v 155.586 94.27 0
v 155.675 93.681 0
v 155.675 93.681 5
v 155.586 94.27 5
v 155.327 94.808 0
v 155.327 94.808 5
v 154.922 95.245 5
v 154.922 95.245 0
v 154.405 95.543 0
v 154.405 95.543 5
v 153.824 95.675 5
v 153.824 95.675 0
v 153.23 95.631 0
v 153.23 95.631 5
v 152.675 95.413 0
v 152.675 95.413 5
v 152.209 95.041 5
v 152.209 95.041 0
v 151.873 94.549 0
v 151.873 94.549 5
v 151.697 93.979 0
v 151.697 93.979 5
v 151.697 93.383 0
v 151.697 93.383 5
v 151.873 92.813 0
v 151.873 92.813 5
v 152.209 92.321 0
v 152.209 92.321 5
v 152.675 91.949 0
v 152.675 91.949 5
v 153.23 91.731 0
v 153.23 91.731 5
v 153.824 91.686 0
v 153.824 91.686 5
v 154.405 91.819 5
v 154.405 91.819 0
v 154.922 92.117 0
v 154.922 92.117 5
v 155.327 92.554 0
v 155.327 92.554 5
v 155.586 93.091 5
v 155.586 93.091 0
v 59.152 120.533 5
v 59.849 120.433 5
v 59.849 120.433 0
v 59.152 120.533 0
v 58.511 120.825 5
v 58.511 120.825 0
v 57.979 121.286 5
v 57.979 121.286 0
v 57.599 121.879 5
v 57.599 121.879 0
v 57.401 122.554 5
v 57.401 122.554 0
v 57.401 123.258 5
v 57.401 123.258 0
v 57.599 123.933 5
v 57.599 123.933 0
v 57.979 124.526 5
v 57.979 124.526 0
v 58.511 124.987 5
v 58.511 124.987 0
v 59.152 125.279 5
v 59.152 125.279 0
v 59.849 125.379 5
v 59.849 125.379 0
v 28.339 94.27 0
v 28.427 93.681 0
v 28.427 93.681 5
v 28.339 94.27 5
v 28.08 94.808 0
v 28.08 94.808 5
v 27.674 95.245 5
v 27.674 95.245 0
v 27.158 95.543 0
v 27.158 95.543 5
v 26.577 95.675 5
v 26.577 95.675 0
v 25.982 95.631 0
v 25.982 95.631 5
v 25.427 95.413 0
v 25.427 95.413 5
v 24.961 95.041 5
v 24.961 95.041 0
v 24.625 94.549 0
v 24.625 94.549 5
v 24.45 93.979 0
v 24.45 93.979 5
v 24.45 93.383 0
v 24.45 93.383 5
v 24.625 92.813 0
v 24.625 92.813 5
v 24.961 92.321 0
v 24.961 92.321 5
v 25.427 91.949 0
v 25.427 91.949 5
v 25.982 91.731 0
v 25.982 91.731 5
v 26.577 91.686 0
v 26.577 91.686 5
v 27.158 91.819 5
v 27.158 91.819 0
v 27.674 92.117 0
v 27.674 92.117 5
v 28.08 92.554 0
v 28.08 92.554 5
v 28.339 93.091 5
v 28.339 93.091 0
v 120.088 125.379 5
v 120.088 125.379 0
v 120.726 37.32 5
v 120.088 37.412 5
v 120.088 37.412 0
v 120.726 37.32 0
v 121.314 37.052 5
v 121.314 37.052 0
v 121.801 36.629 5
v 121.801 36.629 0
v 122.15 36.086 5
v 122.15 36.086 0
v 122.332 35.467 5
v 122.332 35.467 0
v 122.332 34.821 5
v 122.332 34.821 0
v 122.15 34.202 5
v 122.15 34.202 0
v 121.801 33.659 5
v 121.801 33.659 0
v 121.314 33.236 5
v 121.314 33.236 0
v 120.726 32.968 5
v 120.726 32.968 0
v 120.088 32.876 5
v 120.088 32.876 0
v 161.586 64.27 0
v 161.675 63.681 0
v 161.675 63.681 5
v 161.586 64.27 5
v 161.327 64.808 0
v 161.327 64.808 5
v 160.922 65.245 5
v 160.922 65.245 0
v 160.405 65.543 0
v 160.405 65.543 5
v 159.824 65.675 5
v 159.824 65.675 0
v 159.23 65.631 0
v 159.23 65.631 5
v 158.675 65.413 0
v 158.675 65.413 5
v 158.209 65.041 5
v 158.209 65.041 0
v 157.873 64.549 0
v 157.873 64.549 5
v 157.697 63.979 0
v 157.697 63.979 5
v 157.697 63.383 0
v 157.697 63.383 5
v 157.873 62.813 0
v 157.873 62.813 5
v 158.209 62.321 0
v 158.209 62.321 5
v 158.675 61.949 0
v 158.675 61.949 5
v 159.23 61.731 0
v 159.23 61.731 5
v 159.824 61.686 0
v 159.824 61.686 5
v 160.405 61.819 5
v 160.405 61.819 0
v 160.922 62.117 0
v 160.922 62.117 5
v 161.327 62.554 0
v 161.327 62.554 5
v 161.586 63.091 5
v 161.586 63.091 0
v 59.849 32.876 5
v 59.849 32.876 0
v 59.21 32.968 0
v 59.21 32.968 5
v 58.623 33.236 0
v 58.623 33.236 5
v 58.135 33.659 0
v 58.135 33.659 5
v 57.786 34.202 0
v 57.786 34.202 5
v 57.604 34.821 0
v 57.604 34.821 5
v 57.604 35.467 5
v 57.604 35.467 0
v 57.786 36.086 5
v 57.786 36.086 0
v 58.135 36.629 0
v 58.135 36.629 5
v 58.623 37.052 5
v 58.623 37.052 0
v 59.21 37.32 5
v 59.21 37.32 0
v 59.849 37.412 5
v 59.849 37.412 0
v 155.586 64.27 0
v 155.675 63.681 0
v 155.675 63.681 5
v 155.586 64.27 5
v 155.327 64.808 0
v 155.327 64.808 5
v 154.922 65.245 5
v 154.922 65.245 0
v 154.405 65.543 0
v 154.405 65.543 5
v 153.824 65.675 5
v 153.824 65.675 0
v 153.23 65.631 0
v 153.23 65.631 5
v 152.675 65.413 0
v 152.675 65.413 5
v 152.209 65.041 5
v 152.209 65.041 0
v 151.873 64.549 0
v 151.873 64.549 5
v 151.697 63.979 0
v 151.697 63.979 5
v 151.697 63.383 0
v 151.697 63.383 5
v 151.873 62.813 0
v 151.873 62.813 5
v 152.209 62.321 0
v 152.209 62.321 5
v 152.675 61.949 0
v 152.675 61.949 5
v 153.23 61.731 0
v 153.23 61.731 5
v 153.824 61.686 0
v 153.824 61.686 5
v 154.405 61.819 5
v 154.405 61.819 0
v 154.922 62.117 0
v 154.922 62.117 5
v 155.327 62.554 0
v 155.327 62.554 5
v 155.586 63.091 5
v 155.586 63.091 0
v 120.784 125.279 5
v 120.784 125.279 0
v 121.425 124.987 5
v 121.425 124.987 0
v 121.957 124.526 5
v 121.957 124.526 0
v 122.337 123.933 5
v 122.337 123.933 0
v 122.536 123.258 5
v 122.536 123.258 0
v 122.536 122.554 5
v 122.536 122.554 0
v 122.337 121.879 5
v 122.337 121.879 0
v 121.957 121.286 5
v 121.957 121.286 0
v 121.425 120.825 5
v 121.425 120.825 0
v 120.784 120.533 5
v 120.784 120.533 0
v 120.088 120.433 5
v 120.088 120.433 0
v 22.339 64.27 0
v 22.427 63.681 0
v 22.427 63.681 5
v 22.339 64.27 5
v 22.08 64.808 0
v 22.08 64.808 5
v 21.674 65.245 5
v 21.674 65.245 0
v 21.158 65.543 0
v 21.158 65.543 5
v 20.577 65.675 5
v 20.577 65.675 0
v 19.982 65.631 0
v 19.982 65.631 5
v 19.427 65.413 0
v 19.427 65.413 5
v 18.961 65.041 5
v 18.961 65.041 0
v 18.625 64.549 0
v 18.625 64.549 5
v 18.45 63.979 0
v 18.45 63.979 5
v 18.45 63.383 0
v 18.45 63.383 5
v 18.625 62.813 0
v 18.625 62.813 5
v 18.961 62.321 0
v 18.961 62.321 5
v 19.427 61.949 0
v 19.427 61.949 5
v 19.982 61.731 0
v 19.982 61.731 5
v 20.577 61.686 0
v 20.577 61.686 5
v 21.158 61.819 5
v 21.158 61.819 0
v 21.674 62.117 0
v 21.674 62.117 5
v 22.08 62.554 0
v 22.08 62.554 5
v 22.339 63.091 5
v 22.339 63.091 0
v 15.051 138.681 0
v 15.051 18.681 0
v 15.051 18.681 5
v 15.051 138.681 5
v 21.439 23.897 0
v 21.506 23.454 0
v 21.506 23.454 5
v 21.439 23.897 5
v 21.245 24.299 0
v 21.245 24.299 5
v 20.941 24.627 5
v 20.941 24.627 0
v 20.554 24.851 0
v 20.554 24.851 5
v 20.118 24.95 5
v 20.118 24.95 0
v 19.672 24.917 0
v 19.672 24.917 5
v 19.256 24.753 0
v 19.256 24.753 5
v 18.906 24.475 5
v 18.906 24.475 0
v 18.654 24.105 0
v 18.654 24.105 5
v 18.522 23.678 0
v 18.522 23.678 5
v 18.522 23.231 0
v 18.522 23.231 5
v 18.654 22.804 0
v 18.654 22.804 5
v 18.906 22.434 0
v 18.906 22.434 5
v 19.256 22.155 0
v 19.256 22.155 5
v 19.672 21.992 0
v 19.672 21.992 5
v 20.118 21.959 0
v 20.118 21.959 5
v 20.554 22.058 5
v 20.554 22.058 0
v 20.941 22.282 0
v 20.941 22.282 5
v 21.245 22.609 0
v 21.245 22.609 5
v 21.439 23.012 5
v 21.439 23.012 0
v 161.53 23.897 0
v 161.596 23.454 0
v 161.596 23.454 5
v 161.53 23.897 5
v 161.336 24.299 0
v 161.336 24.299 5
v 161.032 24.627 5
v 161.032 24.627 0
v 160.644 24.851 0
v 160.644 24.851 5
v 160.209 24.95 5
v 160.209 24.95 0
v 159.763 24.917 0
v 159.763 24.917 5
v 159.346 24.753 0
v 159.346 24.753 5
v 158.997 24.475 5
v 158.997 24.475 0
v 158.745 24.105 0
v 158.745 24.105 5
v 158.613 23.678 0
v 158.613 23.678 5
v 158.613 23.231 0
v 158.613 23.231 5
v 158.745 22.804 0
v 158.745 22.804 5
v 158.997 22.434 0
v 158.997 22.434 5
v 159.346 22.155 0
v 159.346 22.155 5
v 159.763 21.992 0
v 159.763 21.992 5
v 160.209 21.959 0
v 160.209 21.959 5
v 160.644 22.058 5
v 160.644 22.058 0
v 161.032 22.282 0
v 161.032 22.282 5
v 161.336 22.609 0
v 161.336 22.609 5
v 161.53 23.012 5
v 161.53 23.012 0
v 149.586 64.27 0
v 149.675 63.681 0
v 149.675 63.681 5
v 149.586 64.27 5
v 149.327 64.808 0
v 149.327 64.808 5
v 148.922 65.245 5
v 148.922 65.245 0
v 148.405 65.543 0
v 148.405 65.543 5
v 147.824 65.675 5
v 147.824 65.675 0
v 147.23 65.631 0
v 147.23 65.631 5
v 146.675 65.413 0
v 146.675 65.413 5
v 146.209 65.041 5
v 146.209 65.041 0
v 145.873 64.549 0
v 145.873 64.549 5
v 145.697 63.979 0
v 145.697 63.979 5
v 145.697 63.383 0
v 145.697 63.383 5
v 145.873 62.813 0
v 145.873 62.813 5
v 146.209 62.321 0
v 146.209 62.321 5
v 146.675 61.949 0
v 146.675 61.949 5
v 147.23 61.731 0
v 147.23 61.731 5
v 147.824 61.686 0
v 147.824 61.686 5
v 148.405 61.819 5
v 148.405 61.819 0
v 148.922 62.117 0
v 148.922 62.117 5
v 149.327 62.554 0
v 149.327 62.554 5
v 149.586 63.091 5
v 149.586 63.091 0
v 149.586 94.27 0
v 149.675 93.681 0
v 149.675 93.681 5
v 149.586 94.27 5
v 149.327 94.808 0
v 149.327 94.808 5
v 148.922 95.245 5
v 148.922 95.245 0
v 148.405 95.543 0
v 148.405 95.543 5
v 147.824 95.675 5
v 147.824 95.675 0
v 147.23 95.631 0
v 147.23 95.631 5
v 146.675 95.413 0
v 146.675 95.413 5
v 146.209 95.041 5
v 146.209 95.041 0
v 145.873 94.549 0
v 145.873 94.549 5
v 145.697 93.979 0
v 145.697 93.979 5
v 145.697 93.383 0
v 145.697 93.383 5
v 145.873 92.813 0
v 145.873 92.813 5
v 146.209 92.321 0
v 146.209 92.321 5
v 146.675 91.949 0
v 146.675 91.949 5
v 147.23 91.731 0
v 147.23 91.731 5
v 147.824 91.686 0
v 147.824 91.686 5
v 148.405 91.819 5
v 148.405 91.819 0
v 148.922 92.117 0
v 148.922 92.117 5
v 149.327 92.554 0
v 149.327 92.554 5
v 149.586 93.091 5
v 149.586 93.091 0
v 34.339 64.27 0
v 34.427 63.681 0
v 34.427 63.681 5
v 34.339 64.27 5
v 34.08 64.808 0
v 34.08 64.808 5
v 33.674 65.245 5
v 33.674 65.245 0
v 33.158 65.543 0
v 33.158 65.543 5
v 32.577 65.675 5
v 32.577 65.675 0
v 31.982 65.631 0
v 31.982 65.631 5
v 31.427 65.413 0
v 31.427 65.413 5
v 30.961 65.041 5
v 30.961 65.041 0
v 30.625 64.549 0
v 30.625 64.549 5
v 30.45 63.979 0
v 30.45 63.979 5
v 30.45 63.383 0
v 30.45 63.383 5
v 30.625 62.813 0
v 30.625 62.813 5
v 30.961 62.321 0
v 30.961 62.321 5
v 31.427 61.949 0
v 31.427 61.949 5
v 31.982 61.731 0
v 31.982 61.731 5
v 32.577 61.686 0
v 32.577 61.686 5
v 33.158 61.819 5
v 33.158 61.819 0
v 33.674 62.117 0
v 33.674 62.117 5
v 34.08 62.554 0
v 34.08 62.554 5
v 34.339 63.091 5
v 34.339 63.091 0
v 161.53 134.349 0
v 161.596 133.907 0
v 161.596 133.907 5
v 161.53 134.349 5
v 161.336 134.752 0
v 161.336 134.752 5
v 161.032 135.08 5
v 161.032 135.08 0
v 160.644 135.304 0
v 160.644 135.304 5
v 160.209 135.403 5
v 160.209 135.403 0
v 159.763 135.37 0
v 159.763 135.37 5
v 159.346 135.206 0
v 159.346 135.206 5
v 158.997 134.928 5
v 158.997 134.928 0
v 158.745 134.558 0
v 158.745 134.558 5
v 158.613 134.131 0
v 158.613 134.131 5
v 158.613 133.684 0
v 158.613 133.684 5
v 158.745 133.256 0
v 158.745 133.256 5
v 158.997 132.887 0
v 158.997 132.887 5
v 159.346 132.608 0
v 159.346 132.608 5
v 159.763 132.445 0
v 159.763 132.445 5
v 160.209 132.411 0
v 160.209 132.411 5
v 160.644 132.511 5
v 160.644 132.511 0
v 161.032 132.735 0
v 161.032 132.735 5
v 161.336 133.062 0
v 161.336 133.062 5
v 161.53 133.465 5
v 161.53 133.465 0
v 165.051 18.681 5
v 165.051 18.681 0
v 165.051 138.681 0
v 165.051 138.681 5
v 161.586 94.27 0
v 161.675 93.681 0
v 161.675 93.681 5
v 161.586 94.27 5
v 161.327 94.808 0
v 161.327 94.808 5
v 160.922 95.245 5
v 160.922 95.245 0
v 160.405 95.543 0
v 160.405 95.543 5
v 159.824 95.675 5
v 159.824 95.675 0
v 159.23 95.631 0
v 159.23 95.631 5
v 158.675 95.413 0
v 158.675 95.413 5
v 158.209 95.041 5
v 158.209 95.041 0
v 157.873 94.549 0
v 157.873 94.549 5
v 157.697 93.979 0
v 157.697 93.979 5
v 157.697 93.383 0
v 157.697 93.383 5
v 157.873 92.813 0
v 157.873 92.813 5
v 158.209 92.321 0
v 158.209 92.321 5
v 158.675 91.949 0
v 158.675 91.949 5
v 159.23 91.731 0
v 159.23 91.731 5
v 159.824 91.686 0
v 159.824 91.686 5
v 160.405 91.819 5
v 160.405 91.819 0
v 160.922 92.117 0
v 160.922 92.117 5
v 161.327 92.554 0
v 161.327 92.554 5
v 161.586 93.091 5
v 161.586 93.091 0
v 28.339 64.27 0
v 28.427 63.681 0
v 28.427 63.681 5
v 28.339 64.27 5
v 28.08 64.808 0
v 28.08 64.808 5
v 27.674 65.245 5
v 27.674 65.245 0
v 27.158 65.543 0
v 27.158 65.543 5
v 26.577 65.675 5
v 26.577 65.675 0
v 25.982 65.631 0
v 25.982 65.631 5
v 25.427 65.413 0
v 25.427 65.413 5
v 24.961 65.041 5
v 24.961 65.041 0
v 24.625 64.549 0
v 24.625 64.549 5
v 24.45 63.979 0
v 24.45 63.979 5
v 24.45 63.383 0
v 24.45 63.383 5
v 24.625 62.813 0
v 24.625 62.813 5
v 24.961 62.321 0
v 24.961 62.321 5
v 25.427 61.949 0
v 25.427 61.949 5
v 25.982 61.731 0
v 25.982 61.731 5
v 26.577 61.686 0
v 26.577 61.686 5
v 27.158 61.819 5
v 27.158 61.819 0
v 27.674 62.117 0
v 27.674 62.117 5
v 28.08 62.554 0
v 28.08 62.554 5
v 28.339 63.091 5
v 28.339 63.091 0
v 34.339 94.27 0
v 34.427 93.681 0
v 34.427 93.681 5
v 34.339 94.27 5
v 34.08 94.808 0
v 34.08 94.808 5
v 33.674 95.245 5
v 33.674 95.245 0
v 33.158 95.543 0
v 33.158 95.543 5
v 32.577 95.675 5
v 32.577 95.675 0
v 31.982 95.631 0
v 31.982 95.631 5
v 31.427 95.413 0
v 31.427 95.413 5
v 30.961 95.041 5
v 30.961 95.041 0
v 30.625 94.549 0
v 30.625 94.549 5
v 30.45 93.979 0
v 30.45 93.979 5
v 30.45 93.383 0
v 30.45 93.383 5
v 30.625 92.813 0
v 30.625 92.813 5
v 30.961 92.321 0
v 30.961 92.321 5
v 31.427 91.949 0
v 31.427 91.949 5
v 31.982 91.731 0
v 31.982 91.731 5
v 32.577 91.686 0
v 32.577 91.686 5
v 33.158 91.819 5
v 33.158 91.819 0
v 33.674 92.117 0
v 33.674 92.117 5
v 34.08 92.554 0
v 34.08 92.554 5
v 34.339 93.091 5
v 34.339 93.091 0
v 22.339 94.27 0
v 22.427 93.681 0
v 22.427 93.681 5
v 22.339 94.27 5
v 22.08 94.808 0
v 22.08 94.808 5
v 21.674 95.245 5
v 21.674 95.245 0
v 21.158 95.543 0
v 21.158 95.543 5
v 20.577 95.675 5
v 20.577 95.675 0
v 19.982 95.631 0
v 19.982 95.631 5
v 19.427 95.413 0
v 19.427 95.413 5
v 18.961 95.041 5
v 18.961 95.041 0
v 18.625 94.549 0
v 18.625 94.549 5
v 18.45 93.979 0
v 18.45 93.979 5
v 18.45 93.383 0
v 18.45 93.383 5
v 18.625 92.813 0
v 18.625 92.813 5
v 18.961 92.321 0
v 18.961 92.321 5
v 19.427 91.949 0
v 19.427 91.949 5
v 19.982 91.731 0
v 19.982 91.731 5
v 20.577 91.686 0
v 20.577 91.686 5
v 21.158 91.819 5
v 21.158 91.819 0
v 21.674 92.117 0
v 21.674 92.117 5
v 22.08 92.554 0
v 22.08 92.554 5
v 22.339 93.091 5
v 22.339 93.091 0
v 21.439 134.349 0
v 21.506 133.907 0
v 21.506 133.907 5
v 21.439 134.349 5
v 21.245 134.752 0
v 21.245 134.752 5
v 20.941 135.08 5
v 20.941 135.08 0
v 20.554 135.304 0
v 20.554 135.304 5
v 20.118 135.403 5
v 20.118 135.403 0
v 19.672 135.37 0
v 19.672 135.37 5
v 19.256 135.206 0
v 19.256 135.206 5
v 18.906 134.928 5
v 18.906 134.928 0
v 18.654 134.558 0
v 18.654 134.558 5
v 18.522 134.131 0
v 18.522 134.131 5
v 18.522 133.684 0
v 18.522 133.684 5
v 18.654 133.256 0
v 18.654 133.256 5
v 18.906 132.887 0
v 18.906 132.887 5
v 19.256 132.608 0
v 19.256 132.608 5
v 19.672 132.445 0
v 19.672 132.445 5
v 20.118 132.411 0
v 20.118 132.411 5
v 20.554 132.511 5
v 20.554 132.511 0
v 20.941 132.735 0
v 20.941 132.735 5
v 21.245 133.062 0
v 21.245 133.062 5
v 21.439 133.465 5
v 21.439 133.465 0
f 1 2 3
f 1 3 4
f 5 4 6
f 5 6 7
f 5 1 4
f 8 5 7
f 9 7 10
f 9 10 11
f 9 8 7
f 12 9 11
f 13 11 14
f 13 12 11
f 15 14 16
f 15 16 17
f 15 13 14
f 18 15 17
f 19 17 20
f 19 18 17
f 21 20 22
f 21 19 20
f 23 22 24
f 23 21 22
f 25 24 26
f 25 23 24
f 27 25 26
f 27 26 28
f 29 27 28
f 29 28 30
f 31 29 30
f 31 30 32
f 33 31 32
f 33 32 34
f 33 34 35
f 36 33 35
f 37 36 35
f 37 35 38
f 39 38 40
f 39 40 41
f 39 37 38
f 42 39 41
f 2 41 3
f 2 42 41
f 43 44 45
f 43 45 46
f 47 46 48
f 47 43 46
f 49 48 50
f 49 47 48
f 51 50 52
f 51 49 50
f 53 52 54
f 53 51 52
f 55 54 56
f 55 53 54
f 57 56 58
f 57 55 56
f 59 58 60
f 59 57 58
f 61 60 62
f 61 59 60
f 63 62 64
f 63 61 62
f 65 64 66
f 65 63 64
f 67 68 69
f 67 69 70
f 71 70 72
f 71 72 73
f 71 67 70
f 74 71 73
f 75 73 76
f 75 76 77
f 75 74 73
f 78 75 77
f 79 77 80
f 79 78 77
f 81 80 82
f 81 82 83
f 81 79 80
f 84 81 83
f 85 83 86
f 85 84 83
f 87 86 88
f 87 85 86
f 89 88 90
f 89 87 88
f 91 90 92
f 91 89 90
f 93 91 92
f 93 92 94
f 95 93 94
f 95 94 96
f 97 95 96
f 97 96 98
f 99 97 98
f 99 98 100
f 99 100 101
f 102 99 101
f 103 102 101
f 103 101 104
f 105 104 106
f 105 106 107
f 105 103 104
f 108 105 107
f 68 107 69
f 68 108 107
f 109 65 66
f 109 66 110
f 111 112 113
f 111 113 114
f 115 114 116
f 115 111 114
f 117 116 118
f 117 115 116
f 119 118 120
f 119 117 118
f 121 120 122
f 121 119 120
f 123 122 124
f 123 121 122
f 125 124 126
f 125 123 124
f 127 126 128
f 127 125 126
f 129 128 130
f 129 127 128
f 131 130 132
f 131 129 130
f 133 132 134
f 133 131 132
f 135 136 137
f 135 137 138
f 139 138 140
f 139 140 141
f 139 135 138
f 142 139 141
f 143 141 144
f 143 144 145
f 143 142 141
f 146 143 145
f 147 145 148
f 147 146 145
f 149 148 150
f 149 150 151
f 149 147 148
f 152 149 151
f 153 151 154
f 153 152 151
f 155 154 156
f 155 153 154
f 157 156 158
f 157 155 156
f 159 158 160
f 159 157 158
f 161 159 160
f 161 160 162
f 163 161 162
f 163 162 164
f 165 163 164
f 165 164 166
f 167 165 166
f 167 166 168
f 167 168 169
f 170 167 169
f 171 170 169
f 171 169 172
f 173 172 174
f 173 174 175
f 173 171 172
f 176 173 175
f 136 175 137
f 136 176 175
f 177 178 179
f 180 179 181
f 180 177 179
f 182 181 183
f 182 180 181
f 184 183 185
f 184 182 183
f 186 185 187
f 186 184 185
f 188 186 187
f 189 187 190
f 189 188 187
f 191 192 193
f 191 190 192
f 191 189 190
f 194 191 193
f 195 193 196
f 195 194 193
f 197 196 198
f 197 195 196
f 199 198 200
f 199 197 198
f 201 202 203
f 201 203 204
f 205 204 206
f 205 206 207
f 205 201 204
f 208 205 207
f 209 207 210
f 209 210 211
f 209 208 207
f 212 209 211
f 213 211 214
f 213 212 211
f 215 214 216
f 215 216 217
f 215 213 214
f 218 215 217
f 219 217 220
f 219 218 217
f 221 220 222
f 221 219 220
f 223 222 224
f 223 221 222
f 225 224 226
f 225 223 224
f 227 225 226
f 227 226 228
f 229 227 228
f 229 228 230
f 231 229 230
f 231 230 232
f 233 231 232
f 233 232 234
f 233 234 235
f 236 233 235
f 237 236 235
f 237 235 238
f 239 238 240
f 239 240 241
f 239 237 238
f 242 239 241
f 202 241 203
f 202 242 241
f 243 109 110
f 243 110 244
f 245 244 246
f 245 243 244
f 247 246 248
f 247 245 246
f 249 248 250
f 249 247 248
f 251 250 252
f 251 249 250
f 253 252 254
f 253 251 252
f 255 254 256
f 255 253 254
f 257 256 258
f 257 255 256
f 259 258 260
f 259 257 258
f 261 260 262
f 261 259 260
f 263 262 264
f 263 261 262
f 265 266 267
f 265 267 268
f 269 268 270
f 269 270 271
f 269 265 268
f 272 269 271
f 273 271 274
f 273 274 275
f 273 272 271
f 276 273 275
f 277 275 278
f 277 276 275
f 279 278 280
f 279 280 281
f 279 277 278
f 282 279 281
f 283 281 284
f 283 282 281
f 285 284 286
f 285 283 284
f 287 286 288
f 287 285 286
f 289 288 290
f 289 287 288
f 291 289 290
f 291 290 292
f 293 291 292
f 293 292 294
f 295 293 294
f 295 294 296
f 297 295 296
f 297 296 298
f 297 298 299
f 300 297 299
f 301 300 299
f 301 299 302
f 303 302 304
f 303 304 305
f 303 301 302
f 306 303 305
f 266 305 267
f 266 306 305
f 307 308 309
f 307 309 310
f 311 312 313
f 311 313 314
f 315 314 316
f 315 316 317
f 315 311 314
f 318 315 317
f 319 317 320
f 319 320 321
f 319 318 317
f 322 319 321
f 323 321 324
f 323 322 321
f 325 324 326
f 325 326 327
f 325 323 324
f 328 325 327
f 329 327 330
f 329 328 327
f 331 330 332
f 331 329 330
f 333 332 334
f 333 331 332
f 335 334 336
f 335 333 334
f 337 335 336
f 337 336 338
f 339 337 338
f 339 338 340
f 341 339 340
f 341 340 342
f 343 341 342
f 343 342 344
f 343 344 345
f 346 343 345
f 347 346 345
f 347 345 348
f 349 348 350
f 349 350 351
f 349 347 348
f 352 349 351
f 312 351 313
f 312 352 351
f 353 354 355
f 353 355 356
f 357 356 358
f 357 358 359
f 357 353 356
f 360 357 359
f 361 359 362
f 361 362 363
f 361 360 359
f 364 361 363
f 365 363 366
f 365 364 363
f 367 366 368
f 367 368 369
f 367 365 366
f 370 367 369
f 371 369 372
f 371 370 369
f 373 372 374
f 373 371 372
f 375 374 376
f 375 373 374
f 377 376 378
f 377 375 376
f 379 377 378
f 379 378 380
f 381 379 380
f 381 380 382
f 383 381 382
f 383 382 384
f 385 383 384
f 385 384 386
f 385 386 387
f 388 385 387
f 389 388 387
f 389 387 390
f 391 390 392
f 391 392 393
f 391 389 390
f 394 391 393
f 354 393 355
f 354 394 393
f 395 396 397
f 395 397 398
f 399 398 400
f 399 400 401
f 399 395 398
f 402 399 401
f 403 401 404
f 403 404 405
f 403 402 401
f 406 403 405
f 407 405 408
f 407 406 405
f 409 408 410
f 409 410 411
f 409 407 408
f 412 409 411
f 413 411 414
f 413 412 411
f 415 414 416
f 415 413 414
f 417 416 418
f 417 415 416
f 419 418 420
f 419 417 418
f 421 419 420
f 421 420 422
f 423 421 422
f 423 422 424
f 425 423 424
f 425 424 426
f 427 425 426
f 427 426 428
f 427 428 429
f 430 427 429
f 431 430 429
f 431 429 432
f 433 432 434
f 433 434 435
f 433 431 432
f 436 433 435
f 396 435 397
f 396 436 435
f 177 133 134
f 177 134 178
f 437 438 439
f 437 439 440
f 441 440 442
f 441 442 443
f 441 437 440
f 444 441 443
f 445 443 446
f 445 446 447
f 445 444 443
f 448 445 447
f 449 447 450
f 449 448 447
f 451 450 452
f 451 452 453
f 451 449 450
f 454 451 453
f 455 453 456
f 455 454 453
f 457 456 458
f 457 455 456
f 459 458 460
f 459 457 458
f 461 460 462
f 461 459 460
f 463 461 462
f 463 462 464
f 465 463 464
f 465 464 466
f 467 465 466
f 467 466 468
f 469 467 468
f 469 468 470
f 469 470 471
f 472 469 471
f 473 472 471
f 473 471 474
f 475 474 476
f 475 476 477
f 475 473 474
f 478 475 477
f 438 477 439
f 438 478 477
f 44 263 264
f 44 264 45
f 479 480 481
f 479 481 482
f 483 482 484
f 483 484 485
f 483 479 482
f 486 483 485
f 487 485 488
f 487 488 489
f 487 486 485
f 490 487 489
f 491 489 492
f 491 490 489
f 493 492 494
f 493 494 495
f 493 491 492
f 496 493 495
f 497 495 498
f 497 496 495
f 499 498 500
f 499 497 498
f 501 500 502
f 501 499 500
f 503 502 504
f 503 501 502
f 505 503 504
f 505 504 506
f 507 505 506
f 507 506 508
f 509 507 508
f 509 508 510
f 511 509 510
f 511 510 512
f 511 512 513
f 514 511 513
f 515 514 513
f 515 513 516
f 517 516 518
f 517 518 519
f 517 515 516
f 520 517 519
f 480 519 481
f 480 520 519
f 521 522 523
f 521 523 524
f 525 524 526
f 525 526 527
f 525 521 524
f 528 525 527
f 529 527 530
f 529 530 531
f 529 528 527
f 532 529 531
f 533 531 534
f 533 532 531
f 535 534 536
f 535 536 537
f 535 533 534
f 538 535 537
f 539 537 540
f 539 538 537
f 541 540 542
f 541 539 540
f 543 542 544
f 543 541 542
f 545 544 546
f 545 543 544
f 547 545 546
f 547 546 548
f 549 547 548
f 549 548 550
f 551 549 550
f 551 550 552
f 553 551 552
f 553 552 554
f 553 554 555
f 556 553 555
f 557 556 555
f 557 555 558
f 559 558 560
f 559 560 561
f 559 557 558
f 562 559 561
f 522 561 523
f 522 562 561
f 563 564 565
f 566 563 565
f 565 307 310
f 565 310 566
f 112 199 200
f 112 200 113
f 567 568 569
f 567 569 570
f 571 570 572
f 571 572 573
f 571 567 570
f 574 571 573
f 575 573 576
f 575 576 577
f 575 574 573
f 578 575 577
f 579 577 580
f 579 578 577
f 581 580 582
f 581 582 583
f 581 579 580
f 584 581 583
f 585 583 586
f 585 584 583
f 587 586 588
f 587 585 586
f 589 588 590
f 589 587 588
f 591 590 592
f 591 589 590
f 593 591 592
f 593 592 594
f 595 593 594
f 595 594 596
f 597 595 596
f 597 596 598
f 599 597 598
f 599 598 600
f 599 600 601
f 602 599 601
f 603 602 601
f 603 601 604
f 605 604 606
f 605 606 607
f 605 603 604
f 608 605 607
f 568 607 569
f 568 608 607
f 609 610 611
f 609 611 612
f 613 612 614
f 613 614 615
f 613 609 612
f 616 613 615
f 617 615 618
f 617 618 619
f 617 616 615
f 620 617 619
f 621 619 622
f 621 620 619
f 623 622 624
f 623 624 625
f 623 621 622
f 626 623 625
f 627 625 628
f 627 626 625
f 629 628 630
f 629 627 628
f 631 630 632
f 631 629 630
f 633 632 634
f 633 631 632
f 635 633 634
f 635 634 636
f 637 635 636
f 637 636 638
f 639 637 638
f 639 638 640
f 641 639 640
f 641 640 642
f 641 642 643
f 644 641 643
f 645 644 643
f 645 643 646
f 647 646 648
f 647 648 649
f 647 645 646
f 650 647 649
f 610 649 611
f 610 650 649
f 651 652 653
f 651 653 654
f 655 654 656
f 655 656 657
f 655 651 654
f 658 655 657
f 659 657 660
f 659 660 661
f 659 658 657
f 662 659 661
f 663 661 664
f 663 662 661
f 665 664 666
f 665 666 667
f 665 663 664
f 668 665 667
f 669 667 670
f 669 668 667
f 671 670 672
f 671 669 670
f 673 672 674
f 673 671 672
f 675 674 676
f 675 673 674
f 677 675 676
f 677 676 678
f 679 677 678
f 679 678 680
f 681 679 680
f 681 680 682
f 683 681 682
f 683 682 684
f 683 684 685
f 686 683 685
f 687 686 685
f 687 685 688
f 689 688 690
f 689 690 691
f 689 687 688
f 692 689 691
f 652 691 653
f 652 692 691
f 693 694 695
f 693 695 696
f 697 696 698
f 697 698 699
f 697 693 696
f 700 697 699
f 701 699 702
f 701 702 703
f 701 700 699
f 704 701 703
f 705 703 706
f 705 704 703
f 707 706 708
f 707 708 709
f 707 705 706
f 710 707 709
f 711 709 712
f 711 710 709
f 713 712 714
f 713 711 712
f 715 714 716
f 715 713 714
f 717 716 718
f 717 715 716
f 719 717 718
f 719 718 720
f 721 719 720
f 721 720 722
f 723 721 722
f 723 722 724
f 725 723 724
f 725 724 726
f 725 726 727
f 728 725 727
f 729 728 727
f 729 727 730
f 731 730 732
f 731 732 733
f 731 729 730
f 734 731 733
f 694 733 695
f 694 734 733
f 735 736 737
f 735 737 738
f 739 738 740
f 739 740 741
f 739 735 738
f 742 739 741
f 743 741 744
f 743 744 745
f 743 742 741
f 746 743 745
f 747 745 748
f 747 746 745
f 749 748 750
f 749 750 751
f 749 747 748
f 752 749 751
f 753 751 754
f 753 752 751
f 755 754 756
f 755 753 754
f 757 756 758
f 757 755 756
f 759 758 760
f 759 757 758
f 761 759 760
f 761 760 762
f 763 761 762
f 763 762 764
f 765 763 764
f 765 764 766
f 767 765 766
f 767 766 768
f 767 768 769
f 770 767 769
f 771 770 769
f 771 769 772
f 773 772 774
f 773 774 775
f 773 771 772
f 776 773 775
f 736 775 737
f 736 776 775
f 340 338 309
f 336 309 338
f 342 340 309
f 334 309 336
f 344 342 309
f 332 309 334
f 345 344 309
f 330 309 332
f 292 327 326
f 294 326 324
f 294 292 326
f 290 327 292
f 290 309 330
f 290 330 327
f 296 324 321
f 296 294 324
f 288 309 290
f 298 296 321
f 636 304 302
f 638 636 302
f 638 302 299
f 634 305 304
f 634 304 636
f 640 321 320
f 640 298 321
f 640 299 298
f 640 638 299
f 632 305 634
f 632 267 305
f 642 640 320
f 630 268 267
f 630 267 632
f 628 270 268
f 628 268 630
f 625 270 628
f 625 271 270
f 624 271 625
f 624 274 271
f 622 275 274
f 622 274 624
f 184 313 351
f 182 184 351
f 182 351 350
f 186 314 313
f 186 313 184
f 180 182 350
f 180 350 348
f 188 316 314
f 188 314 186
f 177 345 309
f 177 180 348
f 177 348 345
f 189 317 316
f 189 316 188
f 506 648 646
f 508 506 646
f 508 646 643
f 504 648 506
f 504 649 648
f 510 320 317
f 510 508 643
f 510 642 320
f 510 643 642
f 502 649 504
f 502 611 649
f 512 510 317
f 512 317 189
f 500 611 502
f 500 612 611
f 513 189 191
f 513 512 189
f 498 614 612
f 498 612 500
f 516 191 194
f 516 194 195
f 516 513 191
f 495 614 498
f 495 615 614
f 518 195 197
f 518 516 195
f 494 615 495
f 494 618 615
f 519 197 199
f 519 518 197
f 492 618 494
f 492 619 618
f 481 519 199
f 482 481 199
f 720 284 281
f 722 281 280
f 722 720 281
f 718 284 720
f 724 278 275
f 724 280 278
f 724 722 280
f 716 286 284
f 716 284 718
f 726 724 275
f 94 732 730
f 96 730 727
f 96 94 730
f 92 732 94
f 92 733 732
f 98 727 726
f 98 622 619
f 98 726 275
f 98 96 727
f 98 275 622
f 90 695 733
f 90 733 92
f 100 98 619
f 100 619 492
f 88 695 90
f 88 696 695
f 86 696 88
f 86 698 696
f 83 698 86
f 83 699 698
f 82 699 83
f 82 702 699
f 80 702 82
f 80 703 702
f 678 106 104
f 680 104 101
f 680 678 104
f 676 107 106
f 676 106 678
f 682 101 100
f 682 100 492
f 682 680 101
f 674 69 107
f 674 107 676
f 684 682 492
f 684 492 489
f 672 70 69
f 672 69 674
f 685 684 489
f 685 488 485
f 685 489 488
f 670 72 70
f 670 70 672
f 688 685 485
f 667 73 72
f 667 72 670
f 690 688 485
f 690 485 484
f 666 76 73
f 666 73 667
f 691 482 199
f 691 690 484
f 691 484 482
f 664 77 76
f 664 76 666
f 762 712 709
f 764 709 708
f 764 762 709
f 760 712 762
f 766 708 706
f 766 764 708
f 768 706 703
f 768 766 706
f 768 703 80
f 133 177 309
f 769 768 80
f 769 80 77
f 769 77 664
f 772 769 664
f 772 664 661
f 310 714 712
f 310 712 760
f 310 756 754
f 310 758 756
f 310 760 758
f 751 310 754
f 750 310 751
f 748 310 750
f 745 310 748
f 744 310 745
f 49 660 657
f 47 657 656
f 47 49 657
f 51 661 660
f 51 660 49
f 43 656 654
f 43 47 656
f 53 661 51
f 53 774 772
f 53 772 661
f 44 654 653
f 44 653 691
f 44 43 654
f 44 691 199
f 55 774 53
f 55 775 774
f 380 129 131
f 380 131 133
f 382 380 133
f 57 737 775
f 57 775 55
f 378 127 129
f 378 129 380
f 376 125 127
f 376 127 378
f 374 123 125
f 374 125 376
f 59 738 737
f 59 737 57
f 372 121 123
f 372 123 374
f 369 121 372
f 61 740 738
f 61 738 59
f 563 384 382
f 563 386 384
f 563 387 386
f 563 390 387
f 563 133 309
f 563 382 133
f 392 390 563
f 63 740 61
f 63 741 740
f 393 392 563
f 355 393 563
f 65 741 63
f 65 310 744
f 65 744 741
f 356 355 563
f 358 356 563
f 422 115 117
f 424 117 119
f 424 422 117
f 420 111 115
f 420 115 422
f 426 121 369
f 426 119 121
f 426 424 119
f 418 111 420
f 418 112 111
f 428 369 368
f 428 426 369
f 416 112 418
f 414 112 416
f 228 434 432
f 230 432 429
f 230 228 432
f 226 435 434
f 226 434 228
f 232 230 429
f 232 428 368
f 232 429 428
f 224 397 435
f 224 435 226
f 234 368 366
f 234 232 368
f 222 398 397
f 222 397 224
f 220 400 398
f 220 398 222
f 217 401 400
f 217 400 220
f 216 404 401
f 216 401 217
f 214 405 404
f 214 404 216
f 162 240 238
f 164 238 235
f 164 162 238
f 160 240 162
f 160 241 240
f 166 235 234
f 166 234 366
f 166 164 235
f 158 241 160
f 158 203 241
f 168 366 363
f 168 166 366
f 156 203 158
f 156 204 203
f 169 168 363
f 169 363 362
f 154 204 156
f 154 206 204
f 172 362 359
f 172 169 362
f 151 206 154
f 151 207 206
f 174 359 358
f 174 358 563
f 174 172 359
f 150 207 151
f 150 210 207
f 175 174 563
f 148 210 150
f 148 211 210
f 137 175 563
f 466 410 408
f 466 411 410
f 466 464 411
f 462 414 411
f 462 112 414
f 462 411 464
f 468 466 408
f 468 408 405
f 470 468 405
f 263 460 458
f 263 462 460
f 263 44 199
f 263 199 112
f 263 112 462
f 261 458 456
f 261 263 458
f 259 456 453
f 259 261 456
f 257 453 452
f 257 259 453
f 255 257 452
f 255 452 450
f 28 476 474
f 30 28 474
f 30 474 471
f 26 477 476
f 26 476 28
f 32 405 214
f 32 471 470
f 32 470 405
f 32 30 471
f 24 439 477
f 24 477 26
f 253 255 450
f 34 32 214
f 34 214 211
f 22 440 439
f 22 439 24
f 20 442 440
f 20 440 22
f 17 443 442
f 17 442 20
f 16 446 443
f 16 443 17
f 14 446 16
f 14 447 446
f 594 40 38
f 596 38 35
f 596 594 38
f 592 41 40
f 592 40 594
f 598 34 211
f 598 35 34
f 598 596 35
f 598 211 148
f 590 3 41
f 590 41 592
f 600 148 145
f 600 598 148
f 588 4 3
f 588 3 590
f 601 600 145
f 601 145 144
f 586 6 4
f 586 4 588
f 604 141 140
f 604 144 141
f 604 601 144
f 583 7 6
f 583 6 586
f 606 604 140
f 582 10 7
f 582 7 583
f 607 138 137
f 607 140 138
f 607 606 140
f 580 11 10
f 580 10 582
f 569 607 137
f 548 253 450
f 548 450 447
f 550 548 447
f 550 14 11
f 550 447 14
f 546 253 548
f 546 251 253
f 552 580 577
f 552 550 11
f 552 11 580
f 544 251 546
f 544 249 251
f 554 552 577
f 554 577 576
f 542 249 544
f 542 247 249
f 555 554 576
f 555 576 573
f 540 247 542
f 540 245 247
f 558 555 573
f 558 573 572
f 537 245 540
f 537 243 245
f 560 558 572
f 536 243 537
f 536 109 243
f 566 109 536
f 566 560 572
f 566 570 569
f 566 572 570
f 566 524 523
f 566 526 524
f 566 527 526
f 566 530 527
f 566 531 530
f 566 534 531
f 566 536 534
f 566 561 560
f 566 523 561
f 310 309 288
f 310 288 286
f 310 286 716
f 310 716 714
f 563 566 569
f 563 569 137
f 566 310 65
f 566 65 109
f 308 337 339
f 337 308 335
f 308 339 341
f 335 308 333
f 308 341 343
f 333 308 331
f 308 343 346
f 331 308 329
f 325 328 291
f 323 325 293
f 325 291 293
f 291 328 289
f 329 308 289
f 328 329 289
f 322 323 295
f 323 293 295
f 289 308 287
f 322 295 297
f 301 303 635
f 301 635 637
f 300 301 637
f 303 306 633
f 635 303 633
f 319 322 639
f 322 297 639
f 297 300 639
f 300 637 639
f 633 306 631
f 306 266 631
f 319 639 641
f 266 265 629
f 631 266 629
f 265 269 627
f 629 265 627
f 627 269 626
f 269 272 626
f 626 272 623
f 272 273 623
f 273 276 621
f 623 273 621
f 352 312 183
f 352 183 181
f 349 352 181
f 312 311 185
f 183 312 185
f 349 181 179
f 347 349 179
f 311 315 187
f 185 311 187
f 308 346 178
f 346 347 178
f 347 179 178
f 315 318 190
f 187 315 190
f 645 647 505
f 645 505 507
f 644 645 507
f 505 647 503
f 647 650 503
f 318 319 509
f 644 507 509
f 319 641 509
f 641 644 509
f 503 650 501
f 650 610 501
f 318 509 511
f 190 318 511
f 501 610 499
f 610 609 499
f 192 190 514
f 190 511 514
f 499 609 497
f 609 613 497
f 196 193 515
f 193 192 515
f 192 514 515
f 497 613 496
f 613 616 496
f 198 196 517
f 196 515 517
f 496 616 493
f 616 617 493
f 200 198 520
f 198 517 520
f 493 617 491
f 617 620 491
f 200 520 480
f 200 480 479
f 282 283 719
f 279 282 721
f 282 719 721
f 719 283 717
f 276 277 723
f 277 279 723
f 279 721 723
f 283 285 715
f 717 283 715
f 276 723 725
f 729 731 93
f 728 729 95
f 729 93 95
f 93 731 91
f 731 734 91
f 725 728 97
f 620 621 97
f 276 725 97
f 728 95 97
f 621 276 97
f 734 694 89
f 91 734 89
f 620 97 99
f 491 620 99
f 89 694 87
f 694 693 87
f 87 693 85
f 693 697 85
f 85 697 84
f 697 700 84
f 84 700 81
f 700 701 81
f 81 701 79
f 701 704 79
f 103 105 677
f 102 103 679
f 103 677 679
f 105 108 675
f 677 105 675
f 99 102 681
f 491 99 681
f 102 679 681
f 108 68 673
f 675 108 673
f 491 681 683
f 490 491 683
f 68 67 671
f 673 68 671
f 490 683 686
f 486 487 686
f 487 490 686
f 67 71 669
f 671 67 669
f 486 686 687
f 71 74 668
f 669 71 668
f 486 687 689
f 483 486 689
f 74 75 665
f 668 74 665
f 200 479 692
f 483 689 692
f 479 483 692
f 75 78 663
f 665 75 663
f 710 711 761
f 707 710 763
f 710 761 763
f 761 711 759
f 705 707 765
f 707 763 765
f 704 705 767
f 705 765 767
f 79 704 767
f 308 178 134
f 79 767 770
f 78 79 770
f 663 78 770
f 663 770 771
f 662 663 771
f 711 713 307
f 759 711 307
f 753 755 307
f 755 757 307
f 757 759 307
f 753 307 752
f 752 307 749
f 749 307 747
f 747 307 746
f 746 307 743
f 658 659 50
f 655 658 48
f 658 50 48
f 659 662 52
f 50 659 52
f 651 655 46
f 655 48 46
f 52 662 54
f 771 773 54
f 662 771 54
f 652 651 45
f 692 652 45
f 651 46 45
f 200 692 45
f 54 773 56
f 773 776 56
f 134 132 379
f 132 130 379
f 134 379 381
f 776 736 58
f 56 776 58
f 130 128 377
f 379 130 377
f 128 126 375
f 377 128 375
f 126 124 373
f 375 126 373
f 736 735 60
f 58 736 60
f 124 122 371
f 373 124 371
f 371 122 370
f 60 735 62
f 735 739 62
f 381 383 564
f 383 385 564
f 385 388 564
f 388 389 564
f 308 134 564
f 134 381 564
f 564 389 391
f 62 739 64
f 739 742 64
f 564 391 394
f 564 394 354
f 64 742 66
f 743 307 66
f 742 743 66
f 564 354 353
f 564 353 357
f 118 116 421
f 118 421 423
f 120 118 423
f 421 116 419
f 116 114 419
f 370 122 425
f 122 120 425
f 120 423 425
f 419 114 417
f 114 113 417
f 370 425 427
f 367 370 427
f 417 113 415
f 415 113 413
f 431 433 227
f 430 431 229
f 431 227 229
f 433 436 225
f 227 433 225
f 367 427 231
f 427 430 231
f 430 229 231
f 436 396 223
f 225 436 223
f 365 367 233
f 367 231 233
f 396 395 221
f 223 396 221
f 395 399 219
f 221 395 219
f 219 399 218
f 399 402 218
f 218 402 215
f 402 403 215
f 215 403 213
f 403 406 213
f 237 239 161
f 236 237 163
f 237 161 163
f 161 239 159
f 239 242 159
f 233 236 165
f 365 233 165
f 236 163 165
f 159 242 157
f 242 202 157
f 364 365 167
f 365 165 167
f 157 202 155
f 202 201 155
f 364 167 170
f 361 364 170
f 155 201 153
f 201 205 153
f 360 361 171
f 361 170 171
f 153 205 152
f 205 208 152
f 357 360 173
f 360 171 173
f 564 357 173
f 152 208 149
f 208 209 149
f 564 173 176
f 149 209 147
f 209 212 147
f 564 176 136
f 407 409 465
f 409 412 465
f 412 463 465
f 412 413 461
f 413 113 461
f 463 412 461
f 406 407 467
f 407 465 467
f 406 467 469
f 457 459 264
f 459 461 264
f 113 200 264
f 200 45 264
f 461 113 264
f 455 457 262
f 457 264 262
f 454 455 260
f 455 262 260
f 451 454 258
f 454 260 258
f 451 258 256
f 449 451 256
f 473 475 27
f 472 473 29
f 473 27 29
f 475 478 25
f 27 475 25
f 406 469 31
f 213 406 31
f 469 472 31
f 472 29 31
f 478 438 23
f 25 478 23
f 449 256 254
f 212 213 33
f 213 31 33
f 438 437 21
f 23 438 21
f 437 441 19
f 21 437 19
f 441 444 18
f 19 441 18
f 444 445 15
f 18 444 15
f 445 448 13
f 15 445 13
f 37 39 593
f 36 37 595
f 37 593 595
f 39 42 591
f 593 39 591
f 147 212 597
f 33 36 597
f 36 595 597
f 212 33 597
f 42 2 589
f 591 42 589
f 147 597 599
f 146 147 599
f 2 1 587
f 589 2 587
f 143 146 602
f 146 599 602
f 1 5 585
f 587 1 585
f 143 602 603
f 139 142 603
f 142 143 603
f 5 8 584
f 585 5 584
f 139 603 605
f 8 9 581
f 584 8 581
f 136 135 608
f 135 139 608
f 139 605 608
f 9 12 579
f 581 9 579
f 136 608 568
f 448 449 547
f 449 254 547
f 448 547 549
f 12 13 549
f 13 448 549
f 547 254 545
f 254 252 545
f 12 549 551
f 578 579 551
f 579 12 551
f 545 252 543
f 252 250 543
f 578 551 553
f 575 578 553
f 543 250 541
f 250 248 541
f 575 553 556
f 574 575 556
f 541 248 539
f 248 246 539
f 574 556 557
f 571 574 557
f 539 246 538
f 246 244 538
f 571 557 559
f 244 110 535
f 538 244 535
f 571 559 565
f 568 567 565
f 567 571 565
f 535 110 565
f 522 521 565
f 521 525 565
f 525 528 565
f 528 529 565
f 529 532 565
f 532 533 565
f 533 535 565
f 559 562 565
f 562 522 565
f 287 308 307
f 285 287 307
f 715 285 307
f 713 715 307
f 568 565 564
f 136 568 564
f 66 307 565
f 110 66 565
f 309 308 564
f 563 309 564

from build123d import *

# Parameters (mm, degrees)
MODEL_W             = 150
MODEL_H             = 120
MODEL_R             = 2
MODEL_R_2           = 1.5
BOSS_EXTRUDE1_DEPTH = 5
CUT_EXTRUDE1_DEPTH  = 216.636798312


with BuildPart() as part:
    # Model → Boss-Extrude1 (new body)
    with BuildSketch(Plane.XY):
        with Locations((90.051044639, 78.680861873)):
            Rectangle(MODEL_W, MODEL_H)
        with Locations((20.427424183, 93.680861873)):
            Circle(MODEL_R, mode=Mode.SUBTRACT)
        with Locations((26.427424183, 93.680861873)):
            Circle(MODEL_R, mode=Mode.SUBTRACT)
        with Locations((32.427424183, 93.680861873)):
            Circle(MODEL_R, mode=Mode.SUBTRACT)
        with Locations((20.427424183, 63.680861873)):
            Circle(MODEL_R, mode=Mode.SUBTRACT)
        with Locations((26.427424183, 63.680861873)):
            Circle(MODEL_R, mode=Mode.SUBTRACT)
        with Locations((32.427424183, 63.680861873)):
            Circle(MODEL_R, mode=Mode.SUBTRACT)
        with Locations((159.674665094, 93.680861873)):
            Circle(MODEL_R, mode=Mode.SUBTRACT)
        with Locations((153.674665094, 93.680861873)):
            Circle(MODEL_R, mode=Mode.SUBTRACT)
        with Locations((147.674665094, 93.680861873)):
            Circle(MODEL_R, mode=Mode.SUBTRACT)
        with Locations((159.674665094, 63.680861873)):
            Circle(MODEL_R, mode=Mode.SUBTRACT)
        with Locations((153.674665094, 63.680861873)):
            Circle(MODEL_R, mode=Mode.SUBTRACT)
        with Locations((147.674665094, 63.680861873)):
            Circle(MODEL_R, mode=Mode.SUBTRACT)
        with Locations((20.005670629, 133.907298569)):
            Circle(MODEL_R_2, mode=Mode.SUBTRACT)
        with Locations((160.096418648, 133.907298569)):
            Circle(MODEL_R_2, mode=Mode.SUBTRACT)
        with Locations((20.005670629, 23.454425177)):
            Circle(MODEL_R_2, mode=Mode.SUBTRACT)
        with Locations((160.096418648, 23.454425177)):
            Circle(MODEL_R_2, mode=Mode.SUBTRACT)
    extrude(amount=BOSS_EXTRUDE1_DEPTH)

    # Sketch3 → Cut-Extrude1 (cut, through all)
    with BuildSketch(Plane.XY.offset(5)):
        with BuildLine():
            Line((59.848510467, 125.37915187), (120.08763082, 125.37915187))
            ThreePointArc((120.08763082, 125.37915187), (122.560781495, 122.906001195), (120.08763082, 120.43285052))
            Line((120.08763082, 120.43285052), (59.848510467, 120.43285052))
            ThreePointArc((59.848510467, 120.43285052), (57.375359792, 122.906001195), (59.848510467, 125.37915187))
        make_face()
        with BuildLine():
            Line((59.848510467, 37.411582635), (120.08763082, 37.411582635))
            ThreePointArc((120.08763082, 37.411582635), (122.355268775, 35.14394468), (120.08763082, 32.876306725))
            Line((120.08763082, 32.876306725), (59.848510467, 32.876306725))
            ThreePointArc((59.848510467, 32.876306725), (57.580872512, 35.14394468), (59.848510467, 37.411582635))
        make_face()
    extrude(amount=-CUT_EXTRUDE1_DEPTH, mode=Mode.SUBTRACT)


solid = part.part
